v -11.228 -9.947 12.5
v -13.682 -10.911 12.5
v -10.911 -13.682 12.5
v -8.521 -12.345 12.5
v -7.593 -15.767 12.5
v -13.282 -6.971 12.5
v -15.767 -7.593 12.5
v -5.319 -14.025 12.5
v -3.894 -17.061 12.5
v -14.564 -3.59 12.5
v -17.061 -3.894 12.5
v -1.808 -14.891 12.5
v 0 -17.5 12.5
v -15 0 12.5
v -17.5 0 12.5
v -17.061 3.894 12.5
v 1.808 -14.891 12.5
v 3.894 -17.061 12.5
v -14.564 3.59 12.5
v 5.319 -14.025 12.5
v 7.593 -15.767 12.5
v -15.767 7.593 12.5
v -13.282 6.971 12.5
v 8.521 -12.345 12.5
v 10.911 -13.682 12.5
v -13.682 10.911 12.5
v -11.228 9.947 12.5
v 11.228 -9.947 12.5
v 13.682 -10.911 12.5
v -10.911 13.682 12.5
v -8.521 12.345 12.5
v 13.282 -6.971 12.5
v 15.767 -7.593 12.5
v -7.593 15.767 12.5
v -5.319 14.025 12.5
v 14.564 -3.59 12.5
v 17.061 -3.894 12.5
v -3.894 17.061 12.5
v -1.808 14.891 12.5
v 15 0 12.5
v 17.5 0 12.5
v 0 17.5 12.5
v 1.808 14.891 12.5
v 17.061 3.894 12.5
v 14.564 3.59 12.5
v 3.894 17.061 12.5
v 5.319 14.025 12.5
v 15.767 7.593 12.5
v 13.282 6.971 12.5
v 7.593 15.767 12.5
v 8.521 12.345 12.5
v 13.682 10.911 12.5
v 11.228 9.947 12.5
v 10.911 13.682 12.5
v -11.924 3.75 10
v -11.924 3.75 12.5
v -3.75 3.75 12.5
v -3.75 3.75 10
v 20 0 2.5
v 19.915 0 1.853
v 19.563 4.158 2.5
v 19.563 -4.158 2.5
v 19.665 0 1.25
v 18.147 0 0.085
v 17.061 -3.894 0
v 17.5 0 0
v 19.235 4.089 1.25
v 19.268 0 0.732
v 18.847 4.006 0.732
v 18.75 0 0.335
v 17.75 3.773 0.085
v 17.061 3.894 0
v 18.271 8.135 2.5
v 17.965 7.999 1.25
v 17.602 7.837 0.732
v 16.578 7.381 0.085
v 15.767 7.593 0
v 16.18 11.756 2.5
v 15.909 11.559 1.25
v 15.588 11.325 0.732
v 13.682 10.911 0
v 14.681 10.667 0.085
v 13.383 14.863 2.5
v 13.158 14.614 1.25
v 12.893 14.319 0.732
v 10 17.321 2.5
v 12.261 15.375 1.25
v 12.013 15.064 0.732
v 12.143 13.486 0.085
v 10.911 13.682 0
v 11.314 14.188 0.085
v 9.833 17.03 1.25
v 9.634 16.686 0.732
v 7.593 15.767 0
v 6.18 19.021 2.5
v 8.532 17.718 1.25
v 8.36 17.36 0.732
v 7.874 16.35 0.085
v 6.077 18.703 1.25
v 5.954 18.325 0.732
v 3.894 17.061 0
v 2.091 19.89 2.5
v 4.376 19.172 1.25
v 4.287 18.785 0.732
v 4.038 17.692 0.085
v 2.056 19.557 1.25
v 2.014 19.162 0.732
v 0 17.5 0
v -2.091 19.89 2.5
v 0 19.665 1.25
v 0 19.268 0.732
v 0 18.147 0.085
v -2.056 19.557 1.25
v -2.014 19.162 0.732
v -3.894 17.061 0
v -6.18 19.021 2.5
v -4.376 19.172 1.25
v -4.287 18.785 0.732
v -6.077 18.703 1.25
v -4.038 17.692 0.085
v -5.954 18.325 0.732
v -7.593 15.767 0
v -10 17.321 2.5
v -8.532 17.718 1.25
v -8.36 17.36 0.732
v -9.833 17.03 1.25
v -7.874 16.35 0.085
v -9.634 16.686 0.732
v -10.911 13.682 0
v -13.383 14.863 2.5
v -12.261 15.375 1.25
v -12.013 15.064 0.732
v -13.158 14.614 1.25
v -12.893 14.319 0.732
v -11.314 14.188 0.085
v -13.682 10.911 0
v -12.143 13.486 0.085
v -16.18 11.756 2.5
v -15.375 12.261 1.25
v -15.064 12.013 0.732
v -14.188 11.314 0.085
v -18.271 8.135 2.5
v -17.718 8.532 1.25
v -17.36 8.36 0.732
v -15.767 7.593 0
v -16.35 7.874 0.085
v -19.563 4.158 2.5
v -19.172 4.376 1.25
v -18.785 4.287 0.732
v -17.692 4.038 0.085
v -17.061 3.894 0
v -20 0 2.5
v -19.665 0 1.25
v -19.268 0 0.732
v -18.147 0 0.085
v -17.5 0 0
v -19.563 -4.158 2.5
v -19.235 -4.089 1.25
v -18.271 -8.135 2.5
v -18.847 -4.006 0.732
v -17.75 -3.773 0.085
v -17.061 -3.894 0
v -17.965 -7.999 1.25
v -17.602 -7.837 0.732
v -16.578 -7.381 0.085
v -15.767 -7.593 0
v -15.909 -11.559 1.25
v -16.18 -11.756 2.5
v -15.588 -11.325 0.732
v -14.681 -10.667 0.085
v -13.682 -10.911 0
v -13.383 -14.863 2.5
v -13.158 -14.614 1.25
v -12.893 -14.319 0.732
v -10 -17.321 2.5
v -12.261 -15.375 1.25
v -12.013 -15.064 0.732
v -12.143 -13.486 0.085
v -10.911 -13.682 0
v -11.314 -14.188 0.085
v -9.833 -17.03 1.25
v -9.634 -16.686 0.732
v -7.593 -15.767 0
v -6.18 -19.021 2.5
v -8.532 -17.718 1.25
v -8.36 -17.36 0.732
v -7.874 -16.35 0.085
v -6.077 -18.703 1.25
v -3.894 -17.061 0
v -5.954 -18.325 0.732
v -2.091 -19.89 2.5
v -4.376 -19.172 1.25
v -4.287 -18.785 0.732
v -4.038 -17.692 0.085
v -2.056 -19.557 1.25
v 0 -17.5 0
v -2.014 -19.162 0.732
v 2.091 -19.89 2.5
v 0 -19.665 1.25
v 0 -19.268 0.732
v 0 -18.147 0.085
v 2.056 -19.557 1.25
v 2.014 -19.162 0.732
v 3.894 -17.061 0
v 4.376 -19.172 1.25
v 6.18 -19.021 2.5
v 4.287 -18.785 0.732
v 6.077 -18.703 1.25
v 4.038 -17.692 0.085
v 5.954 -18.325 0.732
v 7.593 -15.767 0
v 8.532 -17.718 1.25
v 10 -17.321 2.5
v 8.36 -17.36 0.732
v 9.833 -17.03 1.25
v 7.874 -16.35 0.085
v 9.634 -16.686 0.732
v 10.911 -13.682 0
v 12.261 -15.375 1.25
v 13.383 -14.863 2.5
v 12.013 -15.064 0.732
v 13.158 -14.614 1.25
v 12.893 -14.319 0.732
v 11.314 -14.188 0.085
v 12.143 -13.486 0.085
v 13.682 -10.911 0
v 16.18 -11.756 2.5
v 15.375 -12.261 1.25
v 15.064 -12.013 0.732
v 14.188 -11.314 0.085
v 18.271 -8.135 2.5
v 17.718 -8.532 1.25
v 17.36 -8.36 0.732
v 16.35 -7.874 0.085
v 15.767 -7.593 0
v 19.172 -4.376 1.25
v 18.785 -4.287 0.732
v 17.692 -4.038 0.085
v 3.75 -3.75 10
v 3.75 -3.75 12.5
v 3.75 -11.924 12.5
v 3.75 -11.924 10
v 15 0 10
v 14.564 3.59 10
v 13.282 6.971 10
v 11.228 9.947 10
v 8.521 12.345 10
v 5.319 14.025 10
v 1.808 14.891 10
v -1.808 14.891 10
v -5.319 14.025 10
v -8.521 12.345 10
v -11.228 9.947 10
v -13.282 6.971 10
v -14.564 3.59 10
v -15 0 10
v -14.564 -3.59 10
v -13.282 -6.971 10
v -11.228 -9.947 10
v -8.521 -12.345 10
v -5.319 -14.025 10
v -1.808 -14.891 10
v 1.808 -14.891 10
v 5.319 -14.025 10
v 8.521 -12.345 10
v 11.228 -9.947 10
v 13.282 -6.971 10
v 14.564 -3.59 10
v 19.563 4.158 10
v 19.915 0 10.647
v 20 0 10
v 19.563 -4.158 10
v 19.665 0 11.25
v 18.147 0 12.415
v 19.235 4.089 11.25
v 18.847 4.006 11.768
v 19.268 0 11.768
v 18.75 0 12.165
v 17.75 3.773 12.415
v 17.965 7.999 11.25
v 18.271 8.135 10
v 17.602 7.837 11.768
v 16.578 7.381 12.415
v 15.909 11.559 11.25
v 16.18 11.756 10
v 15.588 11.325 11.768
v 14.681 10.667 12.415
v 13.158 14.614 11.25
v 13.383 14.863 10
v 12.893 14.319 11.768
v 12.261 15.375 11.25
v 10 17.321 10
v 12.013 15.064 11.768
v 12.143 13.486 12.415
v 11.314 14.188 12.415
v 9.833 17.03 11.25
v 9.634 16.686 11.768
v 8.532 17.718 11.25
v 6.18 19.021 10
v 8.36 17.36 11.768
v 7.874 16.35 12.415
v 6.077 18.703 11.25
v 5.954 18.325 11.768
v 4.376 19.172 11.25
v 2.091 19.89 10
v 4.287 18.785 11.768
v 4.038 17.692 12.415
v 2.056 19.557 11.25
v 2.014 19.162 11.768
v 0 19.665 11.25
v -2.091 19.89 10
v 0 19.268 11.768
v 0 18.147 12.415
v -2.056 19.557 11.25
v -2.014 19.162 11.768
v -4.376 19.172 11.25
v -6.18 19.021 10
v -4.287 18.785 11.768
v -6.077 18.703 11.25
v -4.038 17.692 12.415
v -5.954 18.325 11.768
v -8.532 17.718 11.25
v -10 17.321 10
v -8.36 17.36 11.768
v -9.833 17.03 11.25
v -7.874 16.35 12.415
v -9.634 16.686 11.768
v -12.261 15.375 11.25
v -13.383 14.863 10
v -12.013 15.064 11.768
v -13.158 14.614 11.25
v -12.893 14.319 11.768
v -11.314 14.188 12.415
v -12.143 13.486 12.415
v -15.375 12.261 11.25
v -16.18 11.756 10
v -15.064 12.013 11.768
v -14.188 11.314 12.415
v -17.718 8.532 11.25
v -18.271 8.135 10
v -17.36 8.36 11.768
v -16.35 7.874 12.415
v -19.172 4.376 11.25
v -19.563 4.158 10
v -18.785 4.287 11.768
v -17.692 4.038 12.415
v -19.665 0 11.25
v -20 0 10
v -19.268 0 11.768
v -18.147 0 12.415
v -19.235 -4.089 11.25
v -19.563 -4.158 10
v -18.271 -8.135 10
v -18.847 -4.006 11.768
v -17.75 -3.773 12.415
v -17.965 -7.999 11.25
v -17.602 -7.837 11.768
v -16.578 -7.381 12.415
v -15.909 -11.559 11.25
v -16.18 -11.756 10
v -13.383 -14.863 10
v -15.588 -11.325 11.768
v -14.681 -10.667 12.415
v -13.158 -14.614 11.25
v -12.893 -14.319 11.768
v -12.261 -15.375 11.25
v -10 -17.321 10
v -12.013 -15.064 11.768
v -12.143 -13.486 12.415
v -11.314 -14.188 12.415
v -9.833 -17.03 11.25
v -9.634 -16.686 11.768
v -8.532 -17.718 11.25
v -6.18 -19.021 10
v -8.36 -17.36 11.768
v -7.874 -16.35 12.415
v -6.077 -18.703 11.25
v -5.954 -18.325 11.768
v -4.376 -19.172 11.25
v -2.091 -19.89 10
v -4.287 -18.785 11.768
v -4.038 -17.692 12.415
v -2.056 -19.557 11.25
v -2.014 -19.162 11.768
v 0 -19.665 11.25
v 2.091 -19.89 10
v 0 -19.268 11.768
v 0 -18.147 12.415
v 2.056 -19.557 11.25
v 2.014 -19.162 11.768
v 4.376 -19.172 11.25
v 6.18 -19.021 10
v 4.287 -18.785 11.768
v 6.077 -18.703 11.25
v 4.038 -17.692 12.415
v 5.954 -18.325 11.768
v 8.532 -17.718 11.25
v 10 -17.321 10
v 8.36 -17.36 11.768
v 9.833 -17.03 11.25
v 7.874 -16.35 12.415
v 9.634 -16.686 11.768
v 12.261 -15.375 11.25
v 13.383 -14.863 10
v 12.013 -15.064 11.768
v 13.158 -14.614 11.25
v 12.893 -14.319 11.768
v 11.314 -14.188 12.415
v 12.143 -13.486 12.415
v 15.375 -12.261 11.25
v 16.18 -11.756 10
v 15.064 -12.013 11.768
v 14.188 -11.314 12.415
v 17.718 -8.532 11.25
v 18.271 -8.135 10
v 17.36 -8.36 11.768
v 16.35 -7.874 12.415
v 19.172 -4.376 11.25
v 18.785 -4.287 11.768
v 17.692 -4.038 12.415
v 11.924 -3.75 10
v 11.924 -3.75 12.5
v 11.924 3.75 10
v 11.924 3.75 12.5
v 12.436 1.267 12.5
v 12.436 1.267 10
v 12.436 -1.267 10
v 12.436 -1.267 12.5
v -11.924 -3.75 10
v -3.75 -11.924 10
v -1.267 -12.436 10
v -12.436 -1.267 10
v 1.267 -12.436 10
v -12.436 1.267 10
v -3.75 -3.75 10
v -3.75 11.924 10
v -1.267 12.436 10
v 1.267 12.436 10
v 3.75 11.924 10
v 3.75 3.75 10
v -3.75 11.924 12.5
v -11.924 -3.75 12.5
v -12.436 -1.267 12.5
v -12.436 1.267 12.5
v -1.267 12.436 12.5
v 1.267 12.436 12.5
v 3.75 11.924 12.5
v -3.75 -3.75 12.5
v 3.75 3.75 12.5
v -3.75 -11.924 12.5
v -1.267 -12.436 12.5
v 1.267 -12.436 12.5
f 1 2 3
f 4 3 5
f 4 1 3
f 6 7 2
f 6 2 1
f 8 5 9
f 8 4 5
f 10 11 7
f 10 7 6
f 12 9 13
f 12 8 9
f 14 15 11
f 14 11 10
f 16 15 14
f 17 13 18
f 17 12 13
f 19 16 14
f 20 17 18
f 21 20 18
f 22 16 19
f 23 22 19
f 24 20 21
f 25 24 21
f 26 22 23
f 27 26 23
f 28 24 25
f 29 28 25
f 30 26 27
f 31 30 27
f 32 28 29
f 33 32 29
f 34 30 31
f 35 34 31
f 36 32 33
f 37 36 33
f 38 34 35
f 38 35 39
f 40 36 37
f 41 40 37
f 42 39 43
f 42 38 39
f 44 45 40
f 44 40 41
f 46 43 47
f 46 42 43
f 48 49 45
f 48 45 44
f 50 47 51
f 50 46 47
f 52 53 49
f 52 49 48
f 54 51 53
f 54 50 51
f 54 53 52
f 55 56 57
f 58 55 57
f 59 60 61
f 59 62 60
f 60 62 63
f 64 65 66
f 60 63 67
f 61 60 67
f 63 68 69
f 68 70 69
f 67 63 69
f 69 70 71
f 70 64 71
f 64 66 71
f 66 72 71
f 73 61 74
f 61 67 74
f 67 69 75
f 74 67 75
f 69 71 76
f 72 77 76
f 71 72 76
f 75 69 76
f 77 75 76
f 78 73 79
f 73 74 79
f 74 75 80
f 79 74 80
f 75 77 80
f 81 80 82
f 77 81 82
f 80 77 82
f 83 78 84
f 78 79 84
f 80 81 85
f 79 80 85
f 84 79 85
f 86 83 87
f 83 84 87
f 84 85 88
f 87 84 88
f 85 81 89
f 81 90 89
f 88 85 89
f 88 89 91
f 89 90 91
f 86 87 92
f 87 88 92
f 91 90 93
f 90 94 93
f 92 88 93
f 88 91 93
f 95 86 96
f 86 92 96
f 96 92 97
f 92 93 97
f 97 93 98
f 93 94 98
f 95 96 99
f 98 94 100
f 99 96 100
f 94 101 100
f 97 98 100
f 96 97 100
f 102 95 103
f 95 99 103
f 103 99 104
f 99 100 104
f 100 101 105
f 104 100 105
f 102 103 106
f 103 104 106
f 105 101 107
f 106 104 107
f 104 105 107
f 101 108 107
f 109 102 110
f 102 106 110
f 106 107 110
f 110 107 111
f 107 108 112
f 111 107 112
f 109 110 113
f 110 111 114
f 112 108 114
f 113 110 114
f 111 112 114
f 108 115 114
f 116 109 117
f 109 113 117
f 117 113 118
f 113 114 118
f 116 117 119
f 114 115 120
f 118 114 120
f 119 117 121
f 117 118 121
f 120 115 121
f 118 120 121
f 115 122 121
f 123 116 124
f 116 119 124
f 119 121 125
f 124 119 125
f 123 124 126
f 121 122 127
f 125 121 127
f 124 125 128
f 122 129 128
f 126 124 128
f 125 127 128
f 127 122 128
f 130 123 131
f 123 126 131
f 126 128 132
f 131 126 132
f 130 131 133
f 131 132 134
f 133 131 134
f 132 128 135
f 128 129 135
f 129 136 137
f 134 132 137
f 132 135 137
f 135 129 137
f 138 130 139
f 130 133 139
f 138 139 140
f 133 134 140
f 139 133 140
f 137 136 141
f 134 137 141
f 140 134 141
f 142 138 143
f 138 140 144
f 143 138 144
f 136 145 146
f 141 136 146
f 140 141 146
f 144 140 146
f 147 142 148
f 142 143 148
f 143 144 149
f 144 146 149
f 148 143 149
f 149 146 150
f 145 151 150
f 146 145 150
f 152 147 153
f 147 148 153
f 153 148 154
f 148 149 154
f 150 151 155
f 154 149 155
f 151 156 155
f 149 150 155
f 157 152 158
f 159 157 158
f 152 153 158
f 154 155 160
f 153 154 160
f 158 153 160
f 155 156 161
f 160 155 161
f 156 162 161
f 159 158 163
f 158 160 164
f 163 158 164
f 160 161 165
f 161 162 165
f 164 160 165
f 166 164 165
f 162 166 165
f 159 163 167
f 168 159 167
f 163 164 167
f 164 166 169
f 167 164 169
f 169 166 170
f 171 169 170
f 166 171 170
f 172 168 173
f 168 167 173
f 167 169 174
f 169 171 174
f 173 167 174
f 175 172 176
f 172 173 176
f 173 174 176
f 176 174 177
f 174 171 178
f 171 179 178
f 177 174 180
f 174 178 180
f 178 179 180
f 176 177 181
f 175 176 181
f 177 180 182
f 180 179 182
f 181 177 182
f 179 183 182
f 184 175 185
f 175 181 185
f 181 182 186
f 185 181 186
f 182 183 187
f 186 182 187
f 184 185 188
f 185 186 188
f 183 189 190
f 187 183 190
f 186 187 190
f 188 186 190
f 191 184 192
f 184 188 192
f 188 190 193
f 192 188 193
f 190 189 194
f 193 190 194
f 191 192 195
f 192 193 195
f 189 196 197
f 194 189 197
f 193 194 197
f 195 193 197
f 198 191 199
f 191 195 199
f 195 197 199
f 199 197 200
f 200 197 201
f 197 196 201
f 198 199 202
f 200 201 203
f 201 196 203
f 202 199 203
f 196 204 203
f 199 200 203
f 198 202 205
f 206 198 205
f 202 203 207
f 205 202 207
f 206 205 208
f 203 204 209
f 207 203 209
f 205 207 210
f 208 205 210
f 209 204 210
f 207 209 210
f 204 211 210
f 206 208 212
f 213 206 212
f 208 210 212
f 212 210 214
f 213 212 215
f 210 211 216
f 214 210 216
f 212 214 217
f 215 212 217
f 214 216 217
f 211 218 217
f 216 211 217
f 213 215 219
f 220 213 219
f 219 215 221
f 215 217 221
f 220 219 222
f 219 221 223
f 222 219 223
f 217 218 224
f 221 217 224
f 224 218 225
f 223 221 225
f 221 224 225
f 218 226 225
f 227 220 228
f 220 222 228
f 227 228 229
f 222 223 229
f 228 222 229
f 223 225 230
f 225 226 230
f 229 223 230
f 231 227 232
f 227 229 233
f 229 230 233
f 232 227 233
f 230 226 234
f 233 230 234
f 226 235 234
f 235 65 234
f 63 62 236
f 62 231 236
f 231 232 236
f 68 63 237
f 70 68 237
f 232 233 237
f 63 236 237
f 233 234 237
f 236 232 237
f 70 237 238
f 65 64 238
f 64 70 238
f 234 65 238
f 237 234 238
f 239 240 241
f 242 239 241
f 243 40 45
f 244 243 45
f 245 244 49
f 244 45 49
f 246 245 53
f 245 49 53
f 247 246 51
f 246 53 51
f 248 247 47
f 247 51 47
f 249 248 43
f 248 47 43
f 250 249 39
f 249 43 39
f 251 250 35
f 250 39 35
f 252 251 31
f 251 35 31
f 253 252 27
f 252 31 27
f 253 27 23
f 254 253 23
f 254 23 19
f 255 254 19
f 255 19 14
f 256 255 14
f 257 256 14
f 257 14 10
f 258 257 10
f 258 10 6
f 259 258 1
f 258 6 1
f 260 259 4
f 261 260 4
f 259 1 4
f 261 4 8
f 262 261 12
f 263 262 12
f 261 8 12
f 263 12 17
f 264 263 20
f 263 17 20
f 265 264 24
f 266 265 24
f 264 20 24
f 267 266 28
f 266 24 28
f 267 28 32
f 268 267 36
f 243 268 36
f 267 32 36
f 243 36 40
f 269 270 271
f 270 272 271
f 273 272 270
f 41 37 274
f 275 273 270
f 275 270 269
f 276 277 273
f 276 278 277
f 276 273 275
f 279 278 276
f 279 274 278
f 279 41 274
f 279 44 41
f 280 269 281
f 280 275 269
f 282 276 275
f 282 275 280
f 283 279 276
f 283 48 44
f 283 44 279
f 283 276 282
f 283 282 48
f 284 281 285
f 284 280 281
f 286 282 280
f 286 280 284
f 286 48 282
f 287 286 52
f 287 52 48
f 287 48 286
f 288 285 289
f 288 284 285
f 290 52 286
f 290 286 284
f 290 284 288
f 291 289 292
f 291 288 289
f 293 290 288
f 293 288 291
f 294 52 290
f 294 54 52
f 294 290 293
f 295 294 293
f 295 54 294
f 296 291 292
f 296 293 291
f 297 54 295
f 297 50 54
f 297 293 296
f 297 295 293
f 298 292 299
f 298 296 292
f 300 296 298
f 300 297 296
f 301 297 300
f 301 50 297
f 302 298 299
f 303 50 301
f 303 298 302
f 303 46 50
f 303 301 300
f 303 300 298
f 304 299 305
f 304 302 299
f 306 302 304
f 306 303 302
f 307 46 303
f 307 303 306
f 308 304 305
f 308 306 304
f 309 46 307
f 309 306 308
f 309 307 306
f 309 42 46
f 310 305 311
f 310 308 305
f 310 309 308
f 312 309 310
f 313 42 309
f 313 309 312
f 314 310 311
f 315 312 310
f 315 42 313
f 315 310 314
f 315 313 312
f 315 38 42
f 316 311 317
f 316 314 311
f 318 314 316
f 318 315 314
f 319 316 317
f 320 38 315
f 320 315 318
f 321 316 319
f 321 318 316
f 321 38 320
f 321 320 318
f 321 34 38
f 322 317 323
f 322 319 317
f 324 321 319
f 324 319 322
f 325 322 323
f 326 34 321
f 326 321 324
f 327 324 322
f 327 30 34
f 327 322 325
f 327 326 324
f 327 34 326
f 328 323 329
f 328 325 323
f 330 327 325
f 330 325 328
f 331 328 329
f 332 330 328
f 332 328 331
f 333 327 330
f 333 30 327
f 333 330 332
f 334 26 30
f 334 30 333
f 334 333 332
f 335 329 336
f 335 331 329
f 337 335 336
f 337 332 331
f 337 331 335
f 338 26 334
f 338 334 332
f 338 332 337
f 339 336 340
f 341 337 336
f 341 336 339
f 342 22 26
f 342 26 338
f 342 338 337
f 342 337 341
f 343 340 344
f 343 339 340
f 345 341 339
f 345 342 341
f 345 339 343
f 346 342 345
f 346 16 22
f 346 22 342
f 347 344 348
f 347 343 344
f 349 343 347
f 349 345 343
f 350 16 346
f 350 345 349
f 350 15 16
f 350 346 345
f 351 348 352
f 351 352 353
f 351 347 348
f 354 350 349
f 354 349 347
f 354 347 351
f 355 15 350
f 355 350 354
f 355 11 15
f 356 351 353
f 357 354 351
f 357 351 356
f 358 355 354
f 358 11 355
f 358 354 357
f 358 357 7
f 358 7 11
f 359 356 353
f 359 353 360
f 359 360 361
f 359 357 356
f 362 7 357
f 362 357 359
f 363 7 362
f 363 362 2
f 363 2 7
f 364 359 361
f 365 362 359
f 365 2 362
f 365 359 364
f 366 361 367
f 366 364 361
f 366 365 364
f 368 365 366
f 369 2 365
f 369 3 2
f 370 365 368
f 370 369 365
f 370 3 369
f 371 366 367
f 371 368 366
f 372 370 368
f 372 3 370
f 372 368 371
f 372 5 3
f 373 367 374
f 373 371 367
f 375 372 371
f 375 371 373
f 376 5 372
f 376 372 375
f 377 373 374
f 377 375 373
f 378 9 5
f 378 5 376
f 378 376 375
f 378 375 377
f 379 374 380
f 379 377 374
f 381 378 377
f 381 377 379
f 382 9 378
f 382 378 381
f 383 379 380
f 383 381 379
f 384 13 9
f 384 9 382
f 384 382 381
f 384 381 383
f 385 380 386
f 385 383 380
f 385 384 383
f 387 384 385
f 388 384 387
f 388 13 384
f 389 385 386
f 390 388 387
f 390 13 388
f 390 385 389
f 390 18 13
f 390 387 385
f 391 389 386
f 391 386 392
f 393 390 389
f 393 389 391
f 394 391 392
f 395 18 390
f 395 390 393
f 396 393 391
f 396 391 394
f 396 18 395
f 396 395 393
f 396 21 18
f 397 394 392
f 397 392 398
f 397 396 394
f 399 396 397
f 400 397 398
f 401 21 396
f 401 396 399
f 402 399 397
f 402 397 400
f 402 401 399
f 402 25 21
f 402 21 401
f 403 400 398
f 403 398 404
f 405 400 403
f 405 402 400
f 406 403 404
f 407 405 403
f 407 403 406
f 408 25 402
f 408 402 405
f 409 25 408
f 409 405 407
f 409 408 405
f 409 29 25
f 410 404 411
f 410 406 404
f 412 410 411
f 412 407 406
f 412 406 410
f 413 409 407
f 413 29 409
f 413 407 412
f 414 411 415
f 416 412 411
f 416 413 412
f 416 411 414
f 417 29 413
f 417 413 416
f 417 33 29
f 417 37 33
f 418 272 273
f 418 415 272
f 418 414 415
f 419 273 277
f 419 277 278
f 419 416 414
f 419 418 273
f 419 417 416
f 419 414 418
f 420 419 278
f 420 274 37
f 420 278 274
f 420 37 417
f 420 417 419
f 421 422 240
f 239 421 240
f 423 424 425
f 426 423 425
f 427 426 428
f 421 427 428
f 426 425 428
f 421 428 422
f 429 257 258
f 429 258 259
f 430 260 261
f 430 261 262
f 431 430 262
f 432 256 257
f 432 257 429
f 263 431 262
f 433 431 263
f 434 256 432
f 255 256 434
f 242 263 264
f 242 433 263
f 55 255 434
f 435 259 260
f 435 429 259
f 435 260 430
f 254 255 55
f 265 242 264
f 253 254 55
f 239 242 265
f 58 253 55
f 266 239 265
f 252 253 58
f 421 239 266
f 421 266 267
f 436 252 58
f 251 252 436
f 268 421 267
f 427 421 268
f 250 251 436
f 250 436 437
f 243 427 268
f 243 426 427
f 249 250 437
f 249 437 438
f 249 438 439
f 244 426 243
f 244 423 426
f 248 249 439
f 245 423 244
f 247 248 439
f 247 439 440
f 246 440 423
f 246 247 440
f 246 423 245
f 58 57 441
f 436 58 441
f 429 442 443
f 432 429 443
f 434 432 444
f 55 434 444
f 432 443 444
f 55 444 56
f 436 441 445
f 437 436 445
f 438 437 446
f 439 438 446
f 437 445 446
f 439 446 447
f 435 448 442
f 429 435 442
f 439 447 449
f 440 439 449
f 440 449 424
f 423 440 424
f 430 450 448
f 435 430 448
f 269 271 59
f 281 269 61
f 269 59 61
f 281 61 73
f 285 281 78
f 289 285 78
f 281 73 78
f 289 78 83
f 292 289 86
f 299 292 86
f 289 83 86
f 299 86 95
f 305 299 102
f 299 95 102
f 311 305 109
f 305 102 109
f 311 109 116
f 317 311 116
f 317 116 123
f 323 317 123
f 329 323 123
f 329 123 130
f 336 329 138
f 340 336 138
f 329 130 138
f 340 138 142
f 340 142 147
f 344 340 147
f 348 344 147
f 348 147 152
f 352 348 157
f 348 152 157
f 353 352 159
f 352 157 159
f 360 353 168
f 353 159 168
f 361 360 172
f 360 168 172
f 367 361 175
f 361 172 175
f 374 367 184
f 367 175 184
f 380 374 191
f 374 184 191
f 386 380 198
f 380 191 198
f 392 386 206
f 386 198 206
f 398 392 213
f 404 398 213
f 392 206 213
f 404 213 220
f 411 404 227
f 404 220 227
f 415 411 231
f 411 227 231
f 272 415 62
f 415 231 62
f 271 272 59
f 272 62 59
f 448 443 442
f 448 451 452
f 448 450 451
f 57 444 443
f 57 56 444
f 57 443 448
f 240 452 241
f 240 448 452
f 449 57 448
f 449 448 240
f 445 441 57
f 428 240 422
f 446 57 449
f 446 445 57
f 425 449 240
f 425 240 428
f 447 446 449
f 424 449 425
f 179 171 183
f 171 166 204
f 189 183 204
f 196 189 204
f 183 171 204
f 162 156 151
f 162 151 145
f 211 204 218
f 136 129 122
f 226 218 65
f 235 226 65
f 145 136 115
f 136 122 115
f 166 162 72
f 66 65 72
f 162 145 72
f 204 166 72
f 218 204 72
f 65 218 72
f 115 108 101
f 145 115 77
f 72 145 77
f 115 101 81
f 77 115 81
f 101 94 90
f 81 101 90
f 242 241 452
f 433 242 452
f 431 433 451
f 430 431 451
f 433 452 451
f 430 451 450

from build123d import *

# Parameters (mm, degrees)
F0_R     = 20
F1_DEPTH = 12.5
F2_R     = 2.5
F3_R     = 2.5
F4_R     = 15
F5_DEPTH = 2.5


with BuildPart() as f1:
    # F0 (on Top) → F1 (new body)
    with BuildSketch(Plane.XY):
        Circle(F0_R)
    extrude(amount=F1_DEPTH)

    # F2
    f2_edges = [f1.edges().sort_by_distance(p)[0] for p in [
        (-20, 0, 12.5),
    ]]
    fillet(f2_edges, radius=F2_R)

    # F3
    f3_edges = [f1.edges().sort_by_distance(p)[0] for p in [
        (-20, 0, 0),
    ]]
    fillet(f3_edges, radius=F3_R)

    # F4 (on face) → F5 (cut)
    with BuildSketch(Plane.XY.offset(12.5)):
        Circle(F4_R)
        with BuildLine():
            Line((-3.75, 3.75), (-3.75, 11.92424))
            ThreePointArc((-3.75, 11.92424), (0, 12.5), (3.75, 11.92424))
            Line((3.75, 11.92424), (3.75, 3.75))
            Line((3.75, 3.75), (11.92424, 3.75))
            ThreePointArc((11.92424, 3.75), (12.5, 0), (11.92424, -3.75))
            Line((11.92424, -3.75), (3.75, -3.75))
            Line((3.75, -3.75), (3.75, -11.92424))
            ThreePointArc((3.75, -11.92424), (0, -12.5), (-3.75, -11.92424))
            Line((-3.75, -11.92424), (-3.75, -3.75))
            Line((-3.75, -3.75), (-11.92424, -3.75))
            ThreePointArc((-11.92424, -3.75), (-12.5, 0), (-11.92424, 3.75))
            Line((-11.92424, 3.75), (-3.75, 3.75))
        make_face(mode=Mode.SUBTRACT)
    extrude(amount=-F5_DEPTH, mode=Mode.SUBTRACT)


solid = f1.part
